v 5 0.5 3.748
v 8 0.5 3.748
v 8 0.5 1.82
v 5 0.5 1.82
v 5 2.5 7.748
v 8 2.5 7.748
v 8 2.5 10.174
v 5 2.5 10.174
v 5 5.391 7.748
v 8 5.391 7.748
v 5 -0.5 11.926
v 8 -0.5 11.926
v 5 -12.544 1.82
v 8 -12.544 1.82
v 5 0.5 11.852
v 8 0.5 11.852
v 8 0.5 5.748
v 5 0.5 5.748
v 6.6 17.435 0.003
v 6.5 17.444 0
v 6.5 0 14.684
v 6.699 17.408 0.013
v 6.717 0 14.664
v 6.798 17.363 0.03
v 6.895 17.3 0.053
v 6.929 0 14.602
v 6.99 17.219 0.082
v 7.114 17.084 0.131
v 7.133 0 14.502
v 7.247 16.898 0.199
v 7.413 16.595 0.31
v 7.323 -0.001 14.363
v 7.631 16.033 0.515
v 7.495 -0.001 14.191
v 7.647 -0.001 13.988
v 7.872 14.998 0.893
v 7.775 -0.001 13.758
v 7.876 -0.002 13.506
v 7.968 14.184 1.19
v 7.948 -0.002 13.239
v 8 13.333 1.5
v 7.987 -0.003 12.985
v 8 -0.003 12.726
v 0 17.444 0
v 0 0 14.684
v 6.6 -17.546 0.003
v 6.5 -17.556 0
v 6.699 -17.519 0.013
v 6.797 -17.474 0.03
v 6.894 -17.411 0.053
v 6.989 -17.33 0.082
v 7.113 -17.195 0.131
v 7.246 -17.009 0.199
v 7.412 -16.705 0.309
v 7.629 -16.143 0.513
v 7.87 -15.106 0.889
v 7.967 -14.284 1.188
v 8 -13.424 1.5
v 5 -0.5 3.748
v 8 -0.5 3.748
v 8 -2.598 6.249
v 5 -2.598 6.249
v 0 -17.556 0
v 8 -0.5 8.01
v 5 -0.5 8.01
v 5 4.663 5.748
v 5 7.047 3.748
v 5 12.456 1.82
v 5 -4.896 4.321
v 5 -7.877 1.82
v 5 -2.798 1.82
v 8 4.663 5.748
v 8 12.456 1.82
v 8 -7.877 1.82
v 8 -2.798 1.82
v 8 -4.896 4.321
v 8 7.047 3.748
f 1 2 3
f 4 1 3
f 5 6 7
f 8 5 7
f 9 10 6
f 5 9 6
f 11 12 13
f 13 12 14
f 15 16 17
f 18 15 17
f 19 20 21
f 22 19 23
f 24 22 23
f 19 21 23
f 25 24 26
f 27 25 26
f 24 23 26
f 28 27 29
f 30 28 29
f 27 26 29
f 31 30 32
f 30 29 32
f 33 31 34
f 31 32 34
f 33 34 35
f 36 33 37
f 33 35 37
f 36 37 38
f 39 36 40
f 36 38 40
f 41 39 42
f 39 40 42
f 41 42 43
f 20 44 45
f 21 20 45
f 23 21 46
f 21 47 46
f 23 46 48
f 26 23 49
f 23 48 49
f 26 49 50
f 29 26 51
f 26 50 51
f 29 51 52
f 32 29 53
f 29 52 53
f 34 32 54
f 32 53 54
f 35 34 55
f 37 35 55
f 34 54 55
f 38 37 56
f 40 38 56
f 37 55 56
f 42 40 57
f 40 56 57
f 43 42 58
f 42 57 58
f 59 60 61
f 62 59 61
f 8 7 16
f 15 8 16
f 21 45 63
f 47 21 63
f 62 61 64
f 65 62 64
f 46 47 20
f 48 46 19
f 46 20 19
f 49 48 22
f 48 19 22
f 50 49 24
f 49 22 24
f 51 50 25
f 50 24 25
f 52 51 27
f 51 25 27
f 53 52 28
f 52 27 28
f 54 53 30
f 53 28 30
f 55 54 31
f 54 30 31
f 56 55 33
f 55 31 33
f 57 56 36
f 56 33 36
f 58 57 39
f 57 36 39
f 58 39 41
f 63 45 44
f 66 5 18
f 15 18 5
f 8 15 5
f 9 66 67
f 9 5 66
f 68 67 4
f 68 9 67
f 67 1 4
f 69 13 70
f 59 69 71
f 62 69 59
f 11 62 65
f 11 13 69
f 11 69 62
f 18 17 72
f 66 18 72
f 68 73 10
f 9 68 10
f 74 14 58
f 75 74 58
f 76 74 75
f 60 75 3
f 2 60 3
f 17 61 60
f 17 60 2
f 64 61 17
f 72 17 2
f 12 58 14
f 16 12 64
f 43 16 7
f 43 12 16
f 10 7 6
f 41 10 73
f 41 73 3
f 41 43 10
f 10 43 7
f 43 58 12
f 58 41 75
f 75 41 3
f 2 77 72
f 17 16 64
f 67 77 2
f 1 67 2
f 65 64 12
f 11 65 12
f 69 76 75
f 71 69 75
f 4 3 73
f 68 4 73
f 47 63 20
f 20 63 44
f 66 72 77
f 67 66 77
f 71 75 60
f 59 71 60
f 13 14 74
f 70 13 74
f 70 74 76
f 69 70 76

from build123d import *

# Parameters (mm, degrees)
F1_DEPTH = 8
F3_DEPTH = 3
F4_R     = 1.5


with BuildPart() as f1:
    # F0 (on Right) → F1 (new body)
    with BuildSketch(Plane.YZ):
        Polygon((0, 14.684157), (-17.555564, 0), (17.444436, 0), align=None)
    extrude(amount=F1_DEPTH)

    # F2 (on face) → F3 (cut)
    with BuildSketch(Plane.YZ.offset(8)):
        Polygon((-0.5, 11.925979), (-12.543837, 1.82), (-7.876665, 1.82), (-4.89646, 4.320689), (-2.798133, 1.82), (-0.5, 3.748363), (-2.598327, 6.249052), (-0.5, 8.009757), align=None)
        Polygon((2.5, 10.174213), (0.5, 11.852412), (0.5, 5.748363), (4.663075, 5.748363), (7.046582, 3.748363), (0.5, 3.748363), (0.5, 1.82), (12.456163, 1.82), (5.391016, 7.748363), (2.5, 7.748363), align=None)
    extrude(amount=-F3_DEPTH, mode=Mode.SUBTRACT)

    # F4
    f4_edges = [f1.edges().sort_by_distance(p)[0] for p in [
        (8, 8.722218, 7.342078),
        (8, -8.777782, 7.342078),
        (8, -0.055564, 0),
    ]]
    fillet(f4_edges, radius=F4_R)


solid = f1.part
